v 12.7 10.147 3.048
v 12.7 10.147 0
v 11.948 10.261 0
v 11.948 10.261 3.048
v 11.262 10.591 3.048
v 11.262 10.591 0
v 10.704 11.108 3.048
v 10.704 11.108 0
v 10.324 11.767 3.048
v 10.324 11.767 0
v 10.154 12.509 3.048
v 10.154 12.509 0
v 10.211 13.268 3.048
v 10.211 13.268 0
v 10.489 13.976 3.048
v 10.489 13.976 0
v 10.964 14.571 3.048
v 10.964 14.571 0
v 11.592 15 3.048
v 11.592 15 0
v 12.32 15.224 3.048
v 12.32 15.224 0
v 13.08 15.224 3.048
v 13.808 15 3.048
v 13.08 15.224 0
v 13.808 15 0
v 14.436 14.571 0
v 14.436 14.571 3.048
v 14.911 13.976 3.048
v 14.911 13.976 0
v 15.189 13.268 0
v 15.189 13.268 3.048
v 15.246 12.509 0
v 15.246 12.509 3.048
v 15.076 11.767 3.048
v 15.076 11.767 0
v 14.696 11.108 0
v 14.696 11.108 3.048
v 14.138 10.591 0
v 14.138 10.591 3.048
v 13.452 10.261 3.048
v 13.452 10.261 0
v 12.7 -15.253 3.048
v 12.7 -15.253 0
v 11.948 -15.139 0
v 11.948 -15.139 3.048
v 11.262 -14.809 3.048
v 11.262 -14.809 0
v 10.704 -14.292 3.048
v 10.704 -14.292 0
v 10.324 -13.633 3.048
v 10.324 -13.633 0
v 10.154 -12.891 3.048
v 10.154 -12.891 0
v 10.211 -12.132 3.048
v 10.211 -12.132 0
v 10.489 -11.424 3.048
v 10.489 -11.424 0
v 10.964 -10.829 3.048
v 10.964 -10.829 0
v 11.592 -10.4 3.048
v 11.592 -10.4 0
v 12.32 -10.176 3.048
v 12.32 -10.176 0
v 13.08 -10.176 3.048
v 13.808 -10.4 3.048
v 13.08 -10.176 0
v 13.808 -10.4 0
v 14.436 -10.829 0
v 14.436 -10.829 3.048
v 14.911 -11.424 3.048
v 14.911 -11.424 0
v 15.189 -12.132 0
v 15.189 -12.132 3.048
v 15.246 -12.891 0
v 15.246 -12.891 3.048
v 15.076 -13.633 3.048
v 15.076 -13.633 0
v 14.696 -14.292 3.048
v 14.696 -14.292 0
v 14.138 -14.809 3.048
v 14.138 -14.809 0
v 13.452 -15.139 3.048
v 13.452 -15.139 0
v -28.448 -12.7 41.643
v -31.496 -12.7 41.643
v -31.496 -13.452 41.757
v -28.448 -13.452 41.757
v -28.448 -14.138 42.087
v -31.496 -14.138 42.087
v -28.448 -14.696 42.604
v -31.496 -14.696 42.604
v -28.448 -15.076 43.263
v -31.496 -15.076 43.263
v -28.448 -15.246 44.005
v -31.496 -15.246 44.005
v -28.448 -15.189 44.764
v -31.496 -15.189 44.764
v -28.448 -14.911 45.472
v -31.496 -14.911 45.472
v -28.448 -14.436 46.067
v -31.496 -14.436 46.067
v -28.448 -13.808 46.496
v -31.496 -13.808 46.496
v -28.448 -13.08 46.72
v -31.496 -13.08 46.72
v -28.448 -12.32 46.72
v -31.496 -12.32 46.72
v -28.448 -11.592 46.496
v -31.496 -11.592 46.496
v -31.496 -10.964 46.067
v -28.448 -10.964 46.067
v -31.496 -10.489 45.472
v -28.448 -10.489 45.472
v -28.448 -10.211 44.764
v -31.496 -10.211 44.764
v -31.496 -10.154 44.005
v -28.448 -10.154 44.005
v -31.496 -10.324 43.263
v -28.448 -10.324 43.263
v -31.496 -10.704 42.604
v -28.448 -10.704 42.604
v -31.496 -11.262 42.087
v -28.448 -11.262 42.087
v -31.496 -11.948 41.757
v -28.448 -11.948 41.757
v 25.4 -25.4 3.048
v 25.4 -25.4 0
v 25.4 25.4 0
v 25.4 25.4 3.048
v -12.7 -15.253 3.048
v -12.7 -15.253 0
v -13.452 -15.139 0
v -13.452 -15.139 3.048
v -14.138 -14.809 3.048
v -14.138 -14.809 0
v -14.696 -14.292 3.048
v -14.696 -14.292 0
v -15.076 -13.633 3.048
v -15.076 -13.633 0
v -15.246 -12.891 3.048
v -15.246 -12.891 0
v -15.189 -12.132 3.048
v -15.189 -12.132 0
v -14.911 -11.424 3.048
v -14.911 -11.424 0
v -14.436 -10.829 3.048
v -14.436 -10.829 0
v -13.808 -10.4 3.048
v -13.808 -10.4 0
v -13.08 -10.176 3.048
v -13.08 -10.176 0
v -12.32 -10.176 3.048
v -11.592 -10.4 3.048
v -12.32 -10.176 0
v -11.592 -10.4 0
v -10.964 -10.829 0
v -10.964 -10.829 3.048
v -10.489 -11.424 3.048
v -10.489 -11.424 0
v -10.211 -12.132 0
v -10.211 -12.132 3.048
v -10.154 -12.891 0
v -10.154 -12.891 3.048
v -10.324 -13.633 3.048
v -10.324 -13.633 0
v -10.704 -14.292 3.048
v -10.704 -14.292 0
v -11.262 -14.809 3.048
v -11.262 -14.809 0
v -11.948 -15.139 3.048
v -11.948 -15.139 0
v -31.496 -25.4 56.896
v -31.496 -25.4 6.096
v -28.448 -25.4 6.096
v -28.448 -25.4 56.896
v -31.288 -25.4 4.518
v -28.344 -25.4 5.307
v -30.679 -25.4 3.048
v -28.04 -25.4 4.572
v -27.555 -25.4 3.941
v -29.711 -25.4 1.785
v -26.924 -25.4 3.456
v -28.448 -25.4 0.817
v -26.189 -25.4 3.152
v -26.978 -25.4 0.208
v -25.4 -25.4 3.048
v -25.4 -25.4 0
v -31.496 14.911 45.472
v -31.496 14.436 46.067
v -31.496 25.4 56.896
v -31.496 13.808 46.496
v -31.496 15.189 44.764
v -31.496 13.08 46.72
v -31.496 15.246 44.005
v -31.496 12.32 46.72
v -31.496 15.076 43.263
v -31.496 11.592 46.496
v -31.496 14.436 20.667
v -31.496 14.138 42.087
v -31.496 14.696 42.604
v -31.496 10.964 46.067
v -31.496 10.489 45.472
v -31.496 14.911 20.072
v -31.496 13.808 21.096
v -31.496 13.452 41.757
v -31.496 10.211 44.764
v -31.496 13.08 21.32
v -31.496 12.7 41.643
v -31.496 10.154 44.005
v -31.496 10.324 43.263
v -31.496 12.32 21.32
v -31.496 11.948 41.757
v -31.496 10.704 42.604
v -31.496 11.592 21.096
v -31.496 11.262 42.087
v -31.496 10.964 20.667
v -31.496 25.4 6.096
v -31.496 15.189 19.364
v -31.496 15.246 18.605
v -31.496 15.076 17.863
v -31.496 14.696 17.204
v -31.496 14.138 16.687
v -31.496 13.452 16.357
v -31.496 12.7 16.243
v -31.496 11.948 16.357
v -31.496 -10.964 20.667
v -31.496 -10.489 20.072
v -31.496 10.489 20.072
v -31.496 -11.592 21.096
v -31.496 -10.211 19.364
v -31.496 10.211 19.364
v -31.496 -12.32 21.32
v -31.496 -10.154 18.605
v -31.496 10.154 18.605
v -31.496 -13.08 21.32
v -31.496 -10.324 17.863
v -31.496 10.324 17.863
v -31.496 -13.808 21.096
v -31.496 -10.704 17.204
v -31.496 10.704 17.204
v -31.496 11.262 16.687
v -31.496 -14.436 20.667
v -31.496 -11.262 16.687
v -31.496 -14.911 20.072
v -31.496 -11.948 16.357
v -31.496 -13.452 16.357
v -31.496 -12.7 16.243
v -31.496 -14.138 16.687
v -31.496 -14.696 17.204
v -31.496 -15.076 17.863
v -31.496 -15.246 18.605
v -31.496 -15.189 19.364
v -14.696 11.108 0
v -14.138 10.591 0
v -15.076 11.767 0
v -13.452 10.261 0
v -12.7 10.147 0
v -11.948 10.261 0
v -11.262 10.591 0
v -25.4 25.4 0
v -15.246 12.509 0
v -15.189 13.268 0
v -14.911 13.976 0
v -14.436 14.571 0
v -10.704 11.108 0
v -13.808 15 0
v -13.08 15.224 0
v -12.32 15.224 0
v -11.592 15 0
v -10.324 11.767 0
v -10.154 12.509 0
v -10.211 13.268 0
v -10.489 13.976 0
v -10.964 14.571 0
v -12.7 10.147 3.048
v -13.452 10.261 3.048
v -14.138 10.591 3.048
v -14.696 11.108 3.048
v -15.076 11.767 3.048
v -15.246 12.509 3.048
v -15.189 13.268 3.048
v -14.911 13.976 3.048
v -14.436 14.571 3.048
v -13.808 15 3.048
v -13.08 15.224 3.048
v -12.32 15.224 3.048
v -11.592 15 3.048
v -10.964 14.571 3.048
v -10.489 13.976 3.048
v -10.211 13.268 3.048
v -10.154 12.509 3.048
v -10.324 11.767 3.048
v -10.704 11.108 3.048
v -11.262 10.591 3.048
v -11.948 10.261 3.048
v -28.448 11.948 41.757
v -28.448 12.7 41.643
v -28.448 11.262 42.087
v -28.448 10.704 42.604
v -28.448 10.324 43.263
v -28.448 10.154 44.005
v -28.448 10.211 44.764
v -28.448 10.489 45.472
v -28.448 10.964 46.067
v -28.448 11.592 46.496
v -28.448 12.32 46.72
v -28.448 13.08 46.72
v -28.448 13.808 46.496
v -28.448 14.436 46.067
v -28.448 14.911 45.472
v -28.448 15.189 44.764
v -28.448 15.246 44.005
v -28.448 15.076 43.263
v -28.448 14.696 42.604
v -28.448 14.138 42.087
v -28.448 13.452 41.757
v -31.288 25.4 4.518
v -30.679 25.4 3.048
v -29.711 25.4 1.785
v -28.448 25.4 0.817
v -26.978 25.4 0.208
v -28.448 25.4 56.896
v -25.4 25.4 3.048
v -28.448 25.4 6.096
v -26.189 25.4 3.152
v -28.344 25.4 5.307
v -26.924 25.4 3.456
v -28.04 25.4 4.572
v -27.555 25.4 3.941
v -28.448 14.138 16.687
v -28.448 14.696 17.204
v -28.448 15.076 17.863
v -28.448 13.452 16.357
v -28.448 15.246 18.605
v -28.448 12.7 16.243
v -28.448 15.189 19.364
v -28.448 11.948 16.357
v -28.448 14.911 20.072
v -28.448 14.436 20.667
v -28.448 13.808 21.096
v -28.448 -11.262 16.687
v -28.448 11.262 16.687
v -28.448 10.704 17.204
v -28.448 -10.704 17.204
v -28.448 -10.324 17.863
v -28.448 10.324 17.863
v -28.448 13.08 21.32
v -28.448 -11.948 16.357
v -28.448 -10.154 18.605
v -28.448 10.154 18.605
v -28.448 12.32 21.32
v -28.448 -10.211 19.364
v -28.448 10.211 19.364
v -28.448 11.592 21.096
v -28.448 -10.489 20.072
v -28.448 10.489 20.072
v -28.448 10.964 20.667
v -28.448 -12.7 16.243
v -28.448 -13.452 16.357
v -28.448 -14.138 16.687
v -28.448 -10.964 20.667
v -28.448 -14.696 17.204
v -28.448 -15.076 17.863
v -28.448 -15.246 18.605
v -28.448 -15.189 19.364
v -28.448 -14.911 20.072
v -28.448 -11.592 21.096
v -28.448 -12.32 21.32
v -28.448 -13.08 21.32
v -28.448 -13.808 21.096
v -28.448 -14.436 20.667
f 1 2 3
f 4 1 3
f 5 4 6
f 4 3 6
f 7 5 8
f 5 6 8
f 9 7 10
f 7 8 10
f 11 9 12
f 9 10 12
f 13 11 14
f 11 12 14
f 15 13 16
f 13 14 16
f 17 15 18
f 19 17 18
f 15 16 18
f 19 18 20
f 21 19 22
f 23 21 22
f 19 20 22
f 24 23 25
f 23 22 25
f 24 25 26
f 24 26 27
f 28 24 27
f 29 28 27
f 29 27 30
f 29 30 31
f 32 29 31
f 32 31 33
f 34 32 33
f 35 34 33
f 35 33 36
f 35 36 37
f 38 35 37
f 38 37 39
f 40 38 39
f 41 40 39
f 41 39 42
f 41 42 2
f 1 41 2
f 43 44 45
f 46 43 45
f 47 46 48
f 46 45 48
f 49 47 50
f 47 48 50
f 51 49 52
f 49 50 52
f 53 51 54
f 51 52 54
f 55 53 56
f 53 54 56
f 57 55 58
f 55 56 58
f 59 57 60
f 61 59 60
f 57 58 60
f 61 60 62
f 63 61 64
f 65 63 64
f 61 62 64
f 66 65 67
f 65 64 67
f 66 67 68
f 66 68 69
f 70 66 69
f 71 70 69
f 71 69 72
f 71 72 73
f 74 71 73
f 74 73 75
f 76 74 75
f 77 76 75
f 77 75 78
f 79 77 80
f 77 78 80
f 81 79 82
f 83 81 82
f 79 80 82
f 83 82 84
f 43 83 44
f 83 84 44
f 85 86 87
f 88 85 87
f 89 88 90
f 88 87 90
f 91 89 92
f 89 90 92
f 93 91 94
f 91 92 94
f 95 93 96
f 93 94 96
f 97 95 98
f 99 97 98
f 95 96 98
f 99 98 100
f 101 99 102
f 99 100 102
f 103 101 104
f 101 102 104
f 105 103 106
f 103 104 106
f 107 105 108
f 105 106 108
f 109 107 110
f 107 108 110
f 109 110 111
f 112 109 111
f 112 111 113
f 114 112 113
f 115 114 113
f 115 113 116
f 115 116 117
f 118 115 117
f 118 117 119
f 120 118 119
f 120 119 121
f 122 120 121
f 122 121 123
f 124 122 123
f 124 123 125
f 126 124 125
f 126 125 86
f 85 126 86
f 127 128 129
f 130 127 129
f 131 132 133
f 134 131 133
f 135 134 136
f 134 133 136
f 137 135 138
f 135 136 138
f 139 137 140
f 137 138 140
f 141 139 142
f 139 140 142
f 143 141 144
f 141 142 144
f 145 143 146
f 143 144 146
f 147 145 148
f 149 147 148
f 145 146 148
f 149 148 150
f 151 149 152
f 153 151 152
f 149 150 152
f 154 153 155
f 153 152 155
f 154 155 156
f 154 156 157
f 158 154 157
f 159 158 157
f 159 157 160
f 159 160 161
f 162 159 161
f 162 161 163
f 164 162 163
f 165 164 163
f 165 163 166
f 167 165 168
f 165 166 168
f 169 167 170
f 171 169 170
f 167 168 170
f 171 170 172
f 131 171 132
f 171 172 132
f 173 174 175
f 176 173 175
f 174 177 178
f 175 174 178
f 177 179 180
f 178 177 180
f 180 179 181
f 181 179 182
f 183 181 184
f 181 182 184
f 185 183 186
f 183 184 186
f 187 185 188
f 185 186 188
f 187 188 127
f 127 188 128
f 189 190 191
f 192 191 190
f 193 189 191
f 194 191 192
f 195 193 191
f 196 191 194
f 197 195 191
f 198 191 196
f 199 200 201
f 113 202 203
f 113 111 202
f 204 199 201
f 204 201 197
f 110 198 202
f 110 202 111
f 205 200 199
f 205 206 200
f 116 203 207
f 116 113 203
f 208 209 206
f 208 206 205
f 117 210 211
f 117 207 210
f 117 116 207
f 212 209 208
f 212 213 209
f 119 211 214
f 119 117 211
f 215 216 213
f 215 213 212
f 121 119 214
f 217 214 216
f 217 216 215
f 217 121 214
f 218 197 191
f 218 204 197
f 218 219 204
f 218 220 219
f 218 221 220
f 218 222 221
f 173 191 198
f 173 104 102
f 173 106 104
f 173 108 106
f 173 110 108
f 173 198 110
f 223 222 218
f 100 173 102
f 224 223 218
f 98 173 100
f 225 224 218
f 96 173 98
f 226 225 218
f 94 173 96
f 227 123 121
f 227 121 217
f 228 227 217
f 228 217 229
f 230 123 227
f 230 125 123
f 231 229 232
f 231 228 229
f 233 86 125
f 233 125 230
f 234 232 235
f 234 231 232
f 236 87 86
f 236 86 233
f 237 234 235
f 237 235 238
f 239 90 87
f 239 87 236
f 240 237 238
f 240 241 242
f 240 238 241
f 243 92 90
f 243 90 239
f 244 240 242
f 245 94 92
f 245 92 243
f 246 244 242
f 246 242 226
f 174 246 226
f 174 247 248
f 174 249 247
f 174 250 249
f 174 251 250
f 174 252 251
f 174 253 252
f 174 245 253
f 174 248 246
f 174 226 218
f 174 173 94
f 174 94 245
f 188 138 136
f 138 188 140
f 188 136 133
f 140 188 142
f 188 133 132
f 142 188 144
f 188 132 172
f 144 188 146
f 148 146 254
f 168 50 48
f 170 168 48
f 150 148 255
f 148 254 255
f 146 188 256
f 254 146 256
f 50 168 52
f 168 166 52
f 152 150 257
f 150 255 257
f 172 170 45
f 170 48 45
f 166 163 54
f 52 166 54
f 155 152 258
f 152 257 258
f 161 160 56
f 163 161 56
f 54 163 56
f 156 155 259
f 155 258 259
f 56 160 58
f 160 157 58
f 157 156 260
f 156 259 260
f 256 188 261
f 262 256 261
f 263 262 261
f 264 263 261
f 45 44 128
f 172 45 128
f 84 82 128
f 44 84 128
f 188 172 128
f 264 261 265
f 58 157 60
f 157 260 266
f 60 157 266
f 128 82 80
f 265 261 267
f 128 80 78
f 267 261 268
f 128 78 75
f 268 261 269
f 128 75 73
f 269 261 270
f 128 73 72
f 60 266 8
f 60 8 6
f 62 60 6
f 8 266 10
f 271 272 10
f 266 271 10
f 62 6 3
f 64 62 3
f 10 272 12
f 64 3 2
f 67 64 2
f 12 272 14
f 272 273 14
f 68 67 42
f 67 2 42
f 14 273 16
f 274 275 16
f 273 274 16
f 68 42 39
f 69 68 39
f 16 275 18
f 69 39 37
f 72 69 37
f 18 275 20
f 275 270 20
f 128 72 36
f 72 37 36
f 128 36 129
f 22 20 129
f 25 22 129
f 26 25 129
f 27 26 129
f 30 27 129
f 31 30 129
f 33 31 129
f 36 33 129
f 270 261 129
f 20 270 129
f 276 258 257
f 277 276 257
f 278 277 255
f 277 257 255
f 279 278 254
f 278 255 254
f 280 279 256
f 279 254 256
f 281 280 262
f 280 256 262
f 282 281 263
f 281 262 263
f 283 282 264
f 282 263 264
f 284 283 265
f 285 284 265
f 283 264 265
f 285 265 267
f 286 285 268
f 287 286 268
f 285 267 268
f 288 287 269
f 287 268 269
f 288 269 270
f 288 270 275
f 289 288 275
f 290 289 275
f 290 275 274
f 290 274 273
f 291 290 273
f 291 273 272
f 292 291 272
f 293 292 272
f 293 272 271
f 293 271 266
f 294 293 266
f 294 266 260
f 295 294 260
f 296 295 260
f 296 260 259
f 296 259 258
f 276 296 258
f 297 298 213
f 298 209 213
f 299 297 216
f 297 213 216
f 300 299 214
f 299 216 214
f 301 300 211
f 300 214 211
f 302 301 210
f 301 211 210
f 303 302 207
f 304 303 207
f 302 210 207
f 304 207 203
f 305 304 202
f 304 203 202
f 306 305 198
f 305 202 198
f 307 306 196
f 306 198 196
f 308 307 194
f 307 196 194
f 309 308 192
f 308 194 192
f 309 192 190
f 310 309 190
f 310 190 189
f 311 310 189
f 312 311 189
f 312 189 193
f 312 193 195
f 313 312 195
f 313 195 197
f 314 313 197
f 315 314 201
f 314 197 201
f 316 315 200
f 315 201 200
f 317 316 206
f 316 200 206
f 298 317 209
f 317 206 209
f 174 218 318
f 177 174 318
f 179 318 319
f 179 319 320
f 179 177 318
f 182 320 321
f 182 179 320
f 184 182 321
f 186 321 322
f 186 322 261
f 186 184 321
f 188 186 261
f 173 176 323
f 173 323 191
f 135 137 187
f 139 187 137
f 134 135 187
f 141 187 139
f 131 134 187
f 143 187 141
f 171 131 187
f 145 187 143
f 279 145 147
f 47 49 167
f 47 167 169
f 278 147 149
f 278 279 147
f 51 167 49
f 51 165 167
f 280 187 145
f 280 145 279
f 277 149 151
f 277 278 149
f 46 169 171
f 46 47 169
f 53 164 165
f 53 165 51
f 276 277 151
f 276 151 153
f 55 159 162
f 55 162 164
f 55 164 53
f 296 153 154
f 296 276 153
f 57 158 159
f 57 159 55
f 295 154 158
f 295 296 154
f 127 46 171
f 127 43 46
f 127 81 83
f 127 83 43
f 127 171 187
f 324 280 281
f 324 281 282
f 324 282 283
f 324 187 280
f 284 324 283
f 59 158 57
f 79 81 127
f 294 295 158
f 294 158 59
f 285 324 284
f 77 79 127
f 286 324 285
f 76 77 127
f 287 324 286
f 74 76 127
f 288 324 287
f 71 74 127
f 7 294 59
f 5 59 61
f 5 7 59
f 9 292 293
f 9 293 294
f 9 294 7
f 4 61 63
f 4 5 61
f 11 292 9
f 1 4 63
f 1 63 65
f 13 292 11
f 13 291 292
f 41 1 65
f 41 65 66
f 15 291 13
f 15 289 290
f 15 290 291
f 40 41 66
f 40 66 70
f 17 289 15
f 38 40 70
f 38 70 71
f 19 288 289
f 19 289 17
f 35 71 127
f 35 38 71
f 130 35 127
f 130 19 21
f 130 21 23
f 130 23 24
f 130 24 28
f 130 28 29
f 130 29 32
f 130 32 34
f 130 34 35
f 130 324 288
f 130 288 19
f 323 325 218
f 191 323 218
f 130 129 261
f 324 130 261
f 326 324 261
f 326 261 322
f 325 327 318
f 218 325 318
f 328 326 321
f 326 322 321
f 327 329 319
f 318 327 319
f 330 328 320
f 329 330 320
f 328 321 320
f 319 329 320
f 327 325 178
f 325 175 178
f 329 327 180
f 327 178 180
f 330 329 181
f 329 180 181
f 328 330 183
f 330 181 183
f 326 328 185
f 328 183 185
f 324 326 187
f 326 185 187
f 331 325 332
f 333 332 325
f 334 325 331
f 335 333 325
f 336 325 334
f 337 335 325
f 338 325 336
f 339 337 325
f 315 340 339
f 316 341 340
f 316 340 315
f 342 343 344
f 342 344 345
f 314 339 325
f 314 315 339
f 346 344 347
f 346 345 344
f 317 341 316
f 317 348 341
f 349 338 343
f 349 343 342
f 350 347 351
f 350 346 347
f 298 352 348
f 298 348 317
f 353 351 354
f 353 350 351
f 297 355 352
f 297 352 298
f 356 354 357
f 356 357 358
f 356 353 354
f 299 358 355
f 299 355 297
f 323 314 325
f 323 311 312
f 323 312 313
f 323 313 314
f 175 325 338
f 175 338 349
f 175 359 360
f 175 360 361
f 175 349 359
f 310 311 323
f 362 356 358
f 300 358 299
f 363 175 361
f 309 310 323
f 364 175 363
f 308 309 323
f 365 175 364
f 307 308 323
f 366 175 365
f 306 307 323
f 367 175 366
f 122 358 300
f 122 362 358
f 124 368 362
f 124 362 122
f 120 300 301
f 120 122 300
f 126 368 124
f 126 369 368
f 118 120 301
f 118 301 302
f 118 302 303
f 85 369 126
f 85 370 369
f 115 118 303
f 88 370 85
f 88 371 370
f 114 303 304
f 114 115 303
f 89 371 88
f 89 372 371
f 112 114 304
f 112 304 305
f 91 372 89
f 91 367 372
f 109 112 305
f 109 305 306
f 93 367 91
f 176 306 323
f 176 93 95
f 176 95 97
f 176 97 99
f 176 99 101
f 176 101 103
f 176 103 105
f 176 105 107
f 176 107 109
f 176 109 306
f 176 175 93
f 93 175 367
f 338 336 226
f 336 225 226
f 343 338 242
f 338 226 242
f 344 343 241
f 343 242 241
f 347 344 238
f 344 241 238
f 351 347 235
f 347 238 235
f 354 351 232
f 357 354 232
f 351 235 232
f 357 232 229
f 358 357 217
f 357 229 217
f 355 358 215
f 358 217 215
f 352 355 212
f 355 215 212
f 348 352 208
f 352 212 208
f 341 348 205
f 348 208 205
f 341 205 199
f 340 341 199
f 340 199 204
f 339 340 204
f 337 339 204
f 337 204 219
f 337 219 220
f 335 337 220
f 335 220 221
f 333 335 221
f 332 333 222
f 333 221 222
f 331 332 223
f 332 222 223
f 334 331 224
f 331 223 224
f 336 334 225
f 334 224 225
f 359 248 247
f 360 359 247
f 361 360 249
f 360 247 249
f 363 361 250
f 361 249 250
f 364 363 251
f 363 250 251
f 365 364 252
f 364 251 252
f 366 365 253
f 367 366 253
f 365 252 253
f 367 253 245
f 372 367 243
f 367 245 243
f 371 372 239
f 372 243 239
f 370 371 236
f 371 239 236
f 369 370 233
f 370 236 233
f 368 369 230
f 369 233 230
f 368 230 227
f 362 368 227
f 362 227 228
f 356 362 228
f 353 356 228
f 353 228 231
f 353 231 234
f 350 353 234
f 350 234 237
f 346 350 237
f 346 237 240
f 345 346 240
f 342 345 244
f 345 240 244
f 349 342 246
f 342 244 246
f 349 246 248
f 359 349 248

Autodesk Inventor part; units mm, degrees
ref_plane "YZ Plane" through (0, 0, 0) normal (1, 0, 0) x (0, 1, 0)
ref_plane "XZ Plane" through (0, 0, 0) normal (0, 1, 0) x (-1, 0, 0)
ref_plane "XY Plane" through (0, 0, 0) normal (0, 0, 1) x (1, 0, 0)
sketch "Sketch1" plane through (0, 0, 0) normal (0, 0, 1) x (1, 0, 0)
  line L0 (25.4, 25.4) -> (-25.4, 25.4)
  line L1 (-25.4, 25.4) -> (-25.4, -25.4)
  line L2 (-25.4, -25.4) -> (25.4, -25.4)
  line L3 (25.4, -25.4) -> (25.4, 25.4)
  line L4 (25.4, 25.4) -> (-25.4, -25.4) construction
  line L5 (-25.4, 25.4) -> (25.4, -25.4) construction
  point P0 (0, 0)
  dimension "d0" = 50.8
  dimension "d1" = 50.8
extrude "Plate1" add sketch "Sketch1" along normal blind 3.048
sketch "Sketch2" plane through (-28.448, -25.4, 6.096) normal (-1, 0, 0) x (0, -1, 0)
  line L0 (-50.8, 0) -> (0, 0)
  line L1 (0, 0) -> (0, 50.8)
  line L2 (0, 50.8) -> (-50.8, 50.8)
  line L3 (-50.8, 50.8) -> (-50.8, 0)
edge flange "Flange1" height 56.896 angle 90 thickness 3.048 bend radius 3.048 thickness toward (-1, 0, 0) relief tear relief width 3.048 relief depth 1.524 edges at (-25.4, 0, 3.048) wall of the first edge with corners at (-28.448, 25.4, 6.096) (-28.448, -25.4, 6.096) (-28.448, -25.4, 56.896) (-28.448, 25.4, 56.896)
bend "Bend1"
corner "Corner1"
sketch "Sketch3" plane through (-28.448, -25.4, 56.896) normal (1, 0, 0) x (0, 0, -1)
  line L0 (50.8, 0) -> (50.8, 50.8) construction
  line L1 (0, 50.8) -> (50.8, 50.8) construction
  line L2 (0, 50.8) -> (0, 0) construction
  line L3 (0, 0) -> (50.8, 0) construction
  point P0 (56.896, 25.4)
  point P1 (38.1, 38.1)
  point P2 (38.1, 12.7)
  point P3 (12.7, 38.1)
  point P4 (12.7, 12.7)
  dimension "d13" = 12.7
  dimension "d14" = 12.7
  dimension "d17" = 25.4
  dimension "d20" = 25.4
hole "Hole1" at (-28.448, 12.7, 18.796) at (-28.448, -12.7, 18.796) at (-28.448, 12.7, 44.196) at (-28.448, -12.7, 44.196) direction (-1, 0, 0) diameter 5.1054 end through all clearance for "Flat Head Machine Screw (82)" size "#10" standard "Ansi Unified Screw Threads"
sketch "Sketch4" plane through (0, 0, 3.048) normal (0, 0, 1) x (1, 0, 0)
  line L0 (-25.4, 25.4) -> (25.4, 25.4) construction
  line L1 (-25.4, -25.4) -> (-25.4, 25.4) construction
  line L2 (25.4, -25.4) -> (-25.4, -25.4) construction
  line L3 (25.4, 25.4) -> (25.4, -25.4) construction
  point P0 (0, 0)
  point P1 (-12.7, 12.7)
  point P2 (12.7, 12.7)
  point P3 (-12.7, -12.7)
  point P4 (12.7, -12.7)
  dimension "d30" = 12.7
  dimension "d31" = 12.7
  dimension "d34" = 25.4
  dimension "d37" = 25.4
hole "Hole2" at (-12.7, 12.7, 3.048) at (12.7, 12.7, 3.048) at (-12.7, -12.7, 3.048) at (12.7, -12.7, 3.048) direction (0, 0, -1) diameter 5.1054 end through all clearance for "Flat Head Machine Screw (82)" size "#10" standard "Ansi Unified Screw Threads"
equation "\"d28\" = Thickness"
equation "\"d2\" = Thickness"
equation "\"d3\" = BendReliefWidth"
equation "\"d4\" = BendReliefDepth"
equation "\"d5\" = MinimumRemnant"
equation "\"d6\" = TransitionRadius"
equation "\"d9\" = BendRadius"
equation "\"d10\" = CornerReliefSize"
equation "\"d11\" = GapSize"
equation "\"d12\" = JacobiRadiusSize"
equation "\"BendRadius\" = Thickness"
equation "\"BendReliefWidth\" = Thickness"
equation "\"BendReliefDepth\" = 0.5 * Thickness"
equation "\"CornerReliefSize\" = 4 * Thickness"
equation "\"MinimumRemnant\" = 2 * Thickness"
equation "\"TransitionRadius\" = BendRadius"
equation "\"JacobiRadiusSize\" = BendRadius"
equation "\"GapSize\" = Thickness"
equation "\"Thickness\" = 3.048"
properties part number "hopper_side_barcket"
